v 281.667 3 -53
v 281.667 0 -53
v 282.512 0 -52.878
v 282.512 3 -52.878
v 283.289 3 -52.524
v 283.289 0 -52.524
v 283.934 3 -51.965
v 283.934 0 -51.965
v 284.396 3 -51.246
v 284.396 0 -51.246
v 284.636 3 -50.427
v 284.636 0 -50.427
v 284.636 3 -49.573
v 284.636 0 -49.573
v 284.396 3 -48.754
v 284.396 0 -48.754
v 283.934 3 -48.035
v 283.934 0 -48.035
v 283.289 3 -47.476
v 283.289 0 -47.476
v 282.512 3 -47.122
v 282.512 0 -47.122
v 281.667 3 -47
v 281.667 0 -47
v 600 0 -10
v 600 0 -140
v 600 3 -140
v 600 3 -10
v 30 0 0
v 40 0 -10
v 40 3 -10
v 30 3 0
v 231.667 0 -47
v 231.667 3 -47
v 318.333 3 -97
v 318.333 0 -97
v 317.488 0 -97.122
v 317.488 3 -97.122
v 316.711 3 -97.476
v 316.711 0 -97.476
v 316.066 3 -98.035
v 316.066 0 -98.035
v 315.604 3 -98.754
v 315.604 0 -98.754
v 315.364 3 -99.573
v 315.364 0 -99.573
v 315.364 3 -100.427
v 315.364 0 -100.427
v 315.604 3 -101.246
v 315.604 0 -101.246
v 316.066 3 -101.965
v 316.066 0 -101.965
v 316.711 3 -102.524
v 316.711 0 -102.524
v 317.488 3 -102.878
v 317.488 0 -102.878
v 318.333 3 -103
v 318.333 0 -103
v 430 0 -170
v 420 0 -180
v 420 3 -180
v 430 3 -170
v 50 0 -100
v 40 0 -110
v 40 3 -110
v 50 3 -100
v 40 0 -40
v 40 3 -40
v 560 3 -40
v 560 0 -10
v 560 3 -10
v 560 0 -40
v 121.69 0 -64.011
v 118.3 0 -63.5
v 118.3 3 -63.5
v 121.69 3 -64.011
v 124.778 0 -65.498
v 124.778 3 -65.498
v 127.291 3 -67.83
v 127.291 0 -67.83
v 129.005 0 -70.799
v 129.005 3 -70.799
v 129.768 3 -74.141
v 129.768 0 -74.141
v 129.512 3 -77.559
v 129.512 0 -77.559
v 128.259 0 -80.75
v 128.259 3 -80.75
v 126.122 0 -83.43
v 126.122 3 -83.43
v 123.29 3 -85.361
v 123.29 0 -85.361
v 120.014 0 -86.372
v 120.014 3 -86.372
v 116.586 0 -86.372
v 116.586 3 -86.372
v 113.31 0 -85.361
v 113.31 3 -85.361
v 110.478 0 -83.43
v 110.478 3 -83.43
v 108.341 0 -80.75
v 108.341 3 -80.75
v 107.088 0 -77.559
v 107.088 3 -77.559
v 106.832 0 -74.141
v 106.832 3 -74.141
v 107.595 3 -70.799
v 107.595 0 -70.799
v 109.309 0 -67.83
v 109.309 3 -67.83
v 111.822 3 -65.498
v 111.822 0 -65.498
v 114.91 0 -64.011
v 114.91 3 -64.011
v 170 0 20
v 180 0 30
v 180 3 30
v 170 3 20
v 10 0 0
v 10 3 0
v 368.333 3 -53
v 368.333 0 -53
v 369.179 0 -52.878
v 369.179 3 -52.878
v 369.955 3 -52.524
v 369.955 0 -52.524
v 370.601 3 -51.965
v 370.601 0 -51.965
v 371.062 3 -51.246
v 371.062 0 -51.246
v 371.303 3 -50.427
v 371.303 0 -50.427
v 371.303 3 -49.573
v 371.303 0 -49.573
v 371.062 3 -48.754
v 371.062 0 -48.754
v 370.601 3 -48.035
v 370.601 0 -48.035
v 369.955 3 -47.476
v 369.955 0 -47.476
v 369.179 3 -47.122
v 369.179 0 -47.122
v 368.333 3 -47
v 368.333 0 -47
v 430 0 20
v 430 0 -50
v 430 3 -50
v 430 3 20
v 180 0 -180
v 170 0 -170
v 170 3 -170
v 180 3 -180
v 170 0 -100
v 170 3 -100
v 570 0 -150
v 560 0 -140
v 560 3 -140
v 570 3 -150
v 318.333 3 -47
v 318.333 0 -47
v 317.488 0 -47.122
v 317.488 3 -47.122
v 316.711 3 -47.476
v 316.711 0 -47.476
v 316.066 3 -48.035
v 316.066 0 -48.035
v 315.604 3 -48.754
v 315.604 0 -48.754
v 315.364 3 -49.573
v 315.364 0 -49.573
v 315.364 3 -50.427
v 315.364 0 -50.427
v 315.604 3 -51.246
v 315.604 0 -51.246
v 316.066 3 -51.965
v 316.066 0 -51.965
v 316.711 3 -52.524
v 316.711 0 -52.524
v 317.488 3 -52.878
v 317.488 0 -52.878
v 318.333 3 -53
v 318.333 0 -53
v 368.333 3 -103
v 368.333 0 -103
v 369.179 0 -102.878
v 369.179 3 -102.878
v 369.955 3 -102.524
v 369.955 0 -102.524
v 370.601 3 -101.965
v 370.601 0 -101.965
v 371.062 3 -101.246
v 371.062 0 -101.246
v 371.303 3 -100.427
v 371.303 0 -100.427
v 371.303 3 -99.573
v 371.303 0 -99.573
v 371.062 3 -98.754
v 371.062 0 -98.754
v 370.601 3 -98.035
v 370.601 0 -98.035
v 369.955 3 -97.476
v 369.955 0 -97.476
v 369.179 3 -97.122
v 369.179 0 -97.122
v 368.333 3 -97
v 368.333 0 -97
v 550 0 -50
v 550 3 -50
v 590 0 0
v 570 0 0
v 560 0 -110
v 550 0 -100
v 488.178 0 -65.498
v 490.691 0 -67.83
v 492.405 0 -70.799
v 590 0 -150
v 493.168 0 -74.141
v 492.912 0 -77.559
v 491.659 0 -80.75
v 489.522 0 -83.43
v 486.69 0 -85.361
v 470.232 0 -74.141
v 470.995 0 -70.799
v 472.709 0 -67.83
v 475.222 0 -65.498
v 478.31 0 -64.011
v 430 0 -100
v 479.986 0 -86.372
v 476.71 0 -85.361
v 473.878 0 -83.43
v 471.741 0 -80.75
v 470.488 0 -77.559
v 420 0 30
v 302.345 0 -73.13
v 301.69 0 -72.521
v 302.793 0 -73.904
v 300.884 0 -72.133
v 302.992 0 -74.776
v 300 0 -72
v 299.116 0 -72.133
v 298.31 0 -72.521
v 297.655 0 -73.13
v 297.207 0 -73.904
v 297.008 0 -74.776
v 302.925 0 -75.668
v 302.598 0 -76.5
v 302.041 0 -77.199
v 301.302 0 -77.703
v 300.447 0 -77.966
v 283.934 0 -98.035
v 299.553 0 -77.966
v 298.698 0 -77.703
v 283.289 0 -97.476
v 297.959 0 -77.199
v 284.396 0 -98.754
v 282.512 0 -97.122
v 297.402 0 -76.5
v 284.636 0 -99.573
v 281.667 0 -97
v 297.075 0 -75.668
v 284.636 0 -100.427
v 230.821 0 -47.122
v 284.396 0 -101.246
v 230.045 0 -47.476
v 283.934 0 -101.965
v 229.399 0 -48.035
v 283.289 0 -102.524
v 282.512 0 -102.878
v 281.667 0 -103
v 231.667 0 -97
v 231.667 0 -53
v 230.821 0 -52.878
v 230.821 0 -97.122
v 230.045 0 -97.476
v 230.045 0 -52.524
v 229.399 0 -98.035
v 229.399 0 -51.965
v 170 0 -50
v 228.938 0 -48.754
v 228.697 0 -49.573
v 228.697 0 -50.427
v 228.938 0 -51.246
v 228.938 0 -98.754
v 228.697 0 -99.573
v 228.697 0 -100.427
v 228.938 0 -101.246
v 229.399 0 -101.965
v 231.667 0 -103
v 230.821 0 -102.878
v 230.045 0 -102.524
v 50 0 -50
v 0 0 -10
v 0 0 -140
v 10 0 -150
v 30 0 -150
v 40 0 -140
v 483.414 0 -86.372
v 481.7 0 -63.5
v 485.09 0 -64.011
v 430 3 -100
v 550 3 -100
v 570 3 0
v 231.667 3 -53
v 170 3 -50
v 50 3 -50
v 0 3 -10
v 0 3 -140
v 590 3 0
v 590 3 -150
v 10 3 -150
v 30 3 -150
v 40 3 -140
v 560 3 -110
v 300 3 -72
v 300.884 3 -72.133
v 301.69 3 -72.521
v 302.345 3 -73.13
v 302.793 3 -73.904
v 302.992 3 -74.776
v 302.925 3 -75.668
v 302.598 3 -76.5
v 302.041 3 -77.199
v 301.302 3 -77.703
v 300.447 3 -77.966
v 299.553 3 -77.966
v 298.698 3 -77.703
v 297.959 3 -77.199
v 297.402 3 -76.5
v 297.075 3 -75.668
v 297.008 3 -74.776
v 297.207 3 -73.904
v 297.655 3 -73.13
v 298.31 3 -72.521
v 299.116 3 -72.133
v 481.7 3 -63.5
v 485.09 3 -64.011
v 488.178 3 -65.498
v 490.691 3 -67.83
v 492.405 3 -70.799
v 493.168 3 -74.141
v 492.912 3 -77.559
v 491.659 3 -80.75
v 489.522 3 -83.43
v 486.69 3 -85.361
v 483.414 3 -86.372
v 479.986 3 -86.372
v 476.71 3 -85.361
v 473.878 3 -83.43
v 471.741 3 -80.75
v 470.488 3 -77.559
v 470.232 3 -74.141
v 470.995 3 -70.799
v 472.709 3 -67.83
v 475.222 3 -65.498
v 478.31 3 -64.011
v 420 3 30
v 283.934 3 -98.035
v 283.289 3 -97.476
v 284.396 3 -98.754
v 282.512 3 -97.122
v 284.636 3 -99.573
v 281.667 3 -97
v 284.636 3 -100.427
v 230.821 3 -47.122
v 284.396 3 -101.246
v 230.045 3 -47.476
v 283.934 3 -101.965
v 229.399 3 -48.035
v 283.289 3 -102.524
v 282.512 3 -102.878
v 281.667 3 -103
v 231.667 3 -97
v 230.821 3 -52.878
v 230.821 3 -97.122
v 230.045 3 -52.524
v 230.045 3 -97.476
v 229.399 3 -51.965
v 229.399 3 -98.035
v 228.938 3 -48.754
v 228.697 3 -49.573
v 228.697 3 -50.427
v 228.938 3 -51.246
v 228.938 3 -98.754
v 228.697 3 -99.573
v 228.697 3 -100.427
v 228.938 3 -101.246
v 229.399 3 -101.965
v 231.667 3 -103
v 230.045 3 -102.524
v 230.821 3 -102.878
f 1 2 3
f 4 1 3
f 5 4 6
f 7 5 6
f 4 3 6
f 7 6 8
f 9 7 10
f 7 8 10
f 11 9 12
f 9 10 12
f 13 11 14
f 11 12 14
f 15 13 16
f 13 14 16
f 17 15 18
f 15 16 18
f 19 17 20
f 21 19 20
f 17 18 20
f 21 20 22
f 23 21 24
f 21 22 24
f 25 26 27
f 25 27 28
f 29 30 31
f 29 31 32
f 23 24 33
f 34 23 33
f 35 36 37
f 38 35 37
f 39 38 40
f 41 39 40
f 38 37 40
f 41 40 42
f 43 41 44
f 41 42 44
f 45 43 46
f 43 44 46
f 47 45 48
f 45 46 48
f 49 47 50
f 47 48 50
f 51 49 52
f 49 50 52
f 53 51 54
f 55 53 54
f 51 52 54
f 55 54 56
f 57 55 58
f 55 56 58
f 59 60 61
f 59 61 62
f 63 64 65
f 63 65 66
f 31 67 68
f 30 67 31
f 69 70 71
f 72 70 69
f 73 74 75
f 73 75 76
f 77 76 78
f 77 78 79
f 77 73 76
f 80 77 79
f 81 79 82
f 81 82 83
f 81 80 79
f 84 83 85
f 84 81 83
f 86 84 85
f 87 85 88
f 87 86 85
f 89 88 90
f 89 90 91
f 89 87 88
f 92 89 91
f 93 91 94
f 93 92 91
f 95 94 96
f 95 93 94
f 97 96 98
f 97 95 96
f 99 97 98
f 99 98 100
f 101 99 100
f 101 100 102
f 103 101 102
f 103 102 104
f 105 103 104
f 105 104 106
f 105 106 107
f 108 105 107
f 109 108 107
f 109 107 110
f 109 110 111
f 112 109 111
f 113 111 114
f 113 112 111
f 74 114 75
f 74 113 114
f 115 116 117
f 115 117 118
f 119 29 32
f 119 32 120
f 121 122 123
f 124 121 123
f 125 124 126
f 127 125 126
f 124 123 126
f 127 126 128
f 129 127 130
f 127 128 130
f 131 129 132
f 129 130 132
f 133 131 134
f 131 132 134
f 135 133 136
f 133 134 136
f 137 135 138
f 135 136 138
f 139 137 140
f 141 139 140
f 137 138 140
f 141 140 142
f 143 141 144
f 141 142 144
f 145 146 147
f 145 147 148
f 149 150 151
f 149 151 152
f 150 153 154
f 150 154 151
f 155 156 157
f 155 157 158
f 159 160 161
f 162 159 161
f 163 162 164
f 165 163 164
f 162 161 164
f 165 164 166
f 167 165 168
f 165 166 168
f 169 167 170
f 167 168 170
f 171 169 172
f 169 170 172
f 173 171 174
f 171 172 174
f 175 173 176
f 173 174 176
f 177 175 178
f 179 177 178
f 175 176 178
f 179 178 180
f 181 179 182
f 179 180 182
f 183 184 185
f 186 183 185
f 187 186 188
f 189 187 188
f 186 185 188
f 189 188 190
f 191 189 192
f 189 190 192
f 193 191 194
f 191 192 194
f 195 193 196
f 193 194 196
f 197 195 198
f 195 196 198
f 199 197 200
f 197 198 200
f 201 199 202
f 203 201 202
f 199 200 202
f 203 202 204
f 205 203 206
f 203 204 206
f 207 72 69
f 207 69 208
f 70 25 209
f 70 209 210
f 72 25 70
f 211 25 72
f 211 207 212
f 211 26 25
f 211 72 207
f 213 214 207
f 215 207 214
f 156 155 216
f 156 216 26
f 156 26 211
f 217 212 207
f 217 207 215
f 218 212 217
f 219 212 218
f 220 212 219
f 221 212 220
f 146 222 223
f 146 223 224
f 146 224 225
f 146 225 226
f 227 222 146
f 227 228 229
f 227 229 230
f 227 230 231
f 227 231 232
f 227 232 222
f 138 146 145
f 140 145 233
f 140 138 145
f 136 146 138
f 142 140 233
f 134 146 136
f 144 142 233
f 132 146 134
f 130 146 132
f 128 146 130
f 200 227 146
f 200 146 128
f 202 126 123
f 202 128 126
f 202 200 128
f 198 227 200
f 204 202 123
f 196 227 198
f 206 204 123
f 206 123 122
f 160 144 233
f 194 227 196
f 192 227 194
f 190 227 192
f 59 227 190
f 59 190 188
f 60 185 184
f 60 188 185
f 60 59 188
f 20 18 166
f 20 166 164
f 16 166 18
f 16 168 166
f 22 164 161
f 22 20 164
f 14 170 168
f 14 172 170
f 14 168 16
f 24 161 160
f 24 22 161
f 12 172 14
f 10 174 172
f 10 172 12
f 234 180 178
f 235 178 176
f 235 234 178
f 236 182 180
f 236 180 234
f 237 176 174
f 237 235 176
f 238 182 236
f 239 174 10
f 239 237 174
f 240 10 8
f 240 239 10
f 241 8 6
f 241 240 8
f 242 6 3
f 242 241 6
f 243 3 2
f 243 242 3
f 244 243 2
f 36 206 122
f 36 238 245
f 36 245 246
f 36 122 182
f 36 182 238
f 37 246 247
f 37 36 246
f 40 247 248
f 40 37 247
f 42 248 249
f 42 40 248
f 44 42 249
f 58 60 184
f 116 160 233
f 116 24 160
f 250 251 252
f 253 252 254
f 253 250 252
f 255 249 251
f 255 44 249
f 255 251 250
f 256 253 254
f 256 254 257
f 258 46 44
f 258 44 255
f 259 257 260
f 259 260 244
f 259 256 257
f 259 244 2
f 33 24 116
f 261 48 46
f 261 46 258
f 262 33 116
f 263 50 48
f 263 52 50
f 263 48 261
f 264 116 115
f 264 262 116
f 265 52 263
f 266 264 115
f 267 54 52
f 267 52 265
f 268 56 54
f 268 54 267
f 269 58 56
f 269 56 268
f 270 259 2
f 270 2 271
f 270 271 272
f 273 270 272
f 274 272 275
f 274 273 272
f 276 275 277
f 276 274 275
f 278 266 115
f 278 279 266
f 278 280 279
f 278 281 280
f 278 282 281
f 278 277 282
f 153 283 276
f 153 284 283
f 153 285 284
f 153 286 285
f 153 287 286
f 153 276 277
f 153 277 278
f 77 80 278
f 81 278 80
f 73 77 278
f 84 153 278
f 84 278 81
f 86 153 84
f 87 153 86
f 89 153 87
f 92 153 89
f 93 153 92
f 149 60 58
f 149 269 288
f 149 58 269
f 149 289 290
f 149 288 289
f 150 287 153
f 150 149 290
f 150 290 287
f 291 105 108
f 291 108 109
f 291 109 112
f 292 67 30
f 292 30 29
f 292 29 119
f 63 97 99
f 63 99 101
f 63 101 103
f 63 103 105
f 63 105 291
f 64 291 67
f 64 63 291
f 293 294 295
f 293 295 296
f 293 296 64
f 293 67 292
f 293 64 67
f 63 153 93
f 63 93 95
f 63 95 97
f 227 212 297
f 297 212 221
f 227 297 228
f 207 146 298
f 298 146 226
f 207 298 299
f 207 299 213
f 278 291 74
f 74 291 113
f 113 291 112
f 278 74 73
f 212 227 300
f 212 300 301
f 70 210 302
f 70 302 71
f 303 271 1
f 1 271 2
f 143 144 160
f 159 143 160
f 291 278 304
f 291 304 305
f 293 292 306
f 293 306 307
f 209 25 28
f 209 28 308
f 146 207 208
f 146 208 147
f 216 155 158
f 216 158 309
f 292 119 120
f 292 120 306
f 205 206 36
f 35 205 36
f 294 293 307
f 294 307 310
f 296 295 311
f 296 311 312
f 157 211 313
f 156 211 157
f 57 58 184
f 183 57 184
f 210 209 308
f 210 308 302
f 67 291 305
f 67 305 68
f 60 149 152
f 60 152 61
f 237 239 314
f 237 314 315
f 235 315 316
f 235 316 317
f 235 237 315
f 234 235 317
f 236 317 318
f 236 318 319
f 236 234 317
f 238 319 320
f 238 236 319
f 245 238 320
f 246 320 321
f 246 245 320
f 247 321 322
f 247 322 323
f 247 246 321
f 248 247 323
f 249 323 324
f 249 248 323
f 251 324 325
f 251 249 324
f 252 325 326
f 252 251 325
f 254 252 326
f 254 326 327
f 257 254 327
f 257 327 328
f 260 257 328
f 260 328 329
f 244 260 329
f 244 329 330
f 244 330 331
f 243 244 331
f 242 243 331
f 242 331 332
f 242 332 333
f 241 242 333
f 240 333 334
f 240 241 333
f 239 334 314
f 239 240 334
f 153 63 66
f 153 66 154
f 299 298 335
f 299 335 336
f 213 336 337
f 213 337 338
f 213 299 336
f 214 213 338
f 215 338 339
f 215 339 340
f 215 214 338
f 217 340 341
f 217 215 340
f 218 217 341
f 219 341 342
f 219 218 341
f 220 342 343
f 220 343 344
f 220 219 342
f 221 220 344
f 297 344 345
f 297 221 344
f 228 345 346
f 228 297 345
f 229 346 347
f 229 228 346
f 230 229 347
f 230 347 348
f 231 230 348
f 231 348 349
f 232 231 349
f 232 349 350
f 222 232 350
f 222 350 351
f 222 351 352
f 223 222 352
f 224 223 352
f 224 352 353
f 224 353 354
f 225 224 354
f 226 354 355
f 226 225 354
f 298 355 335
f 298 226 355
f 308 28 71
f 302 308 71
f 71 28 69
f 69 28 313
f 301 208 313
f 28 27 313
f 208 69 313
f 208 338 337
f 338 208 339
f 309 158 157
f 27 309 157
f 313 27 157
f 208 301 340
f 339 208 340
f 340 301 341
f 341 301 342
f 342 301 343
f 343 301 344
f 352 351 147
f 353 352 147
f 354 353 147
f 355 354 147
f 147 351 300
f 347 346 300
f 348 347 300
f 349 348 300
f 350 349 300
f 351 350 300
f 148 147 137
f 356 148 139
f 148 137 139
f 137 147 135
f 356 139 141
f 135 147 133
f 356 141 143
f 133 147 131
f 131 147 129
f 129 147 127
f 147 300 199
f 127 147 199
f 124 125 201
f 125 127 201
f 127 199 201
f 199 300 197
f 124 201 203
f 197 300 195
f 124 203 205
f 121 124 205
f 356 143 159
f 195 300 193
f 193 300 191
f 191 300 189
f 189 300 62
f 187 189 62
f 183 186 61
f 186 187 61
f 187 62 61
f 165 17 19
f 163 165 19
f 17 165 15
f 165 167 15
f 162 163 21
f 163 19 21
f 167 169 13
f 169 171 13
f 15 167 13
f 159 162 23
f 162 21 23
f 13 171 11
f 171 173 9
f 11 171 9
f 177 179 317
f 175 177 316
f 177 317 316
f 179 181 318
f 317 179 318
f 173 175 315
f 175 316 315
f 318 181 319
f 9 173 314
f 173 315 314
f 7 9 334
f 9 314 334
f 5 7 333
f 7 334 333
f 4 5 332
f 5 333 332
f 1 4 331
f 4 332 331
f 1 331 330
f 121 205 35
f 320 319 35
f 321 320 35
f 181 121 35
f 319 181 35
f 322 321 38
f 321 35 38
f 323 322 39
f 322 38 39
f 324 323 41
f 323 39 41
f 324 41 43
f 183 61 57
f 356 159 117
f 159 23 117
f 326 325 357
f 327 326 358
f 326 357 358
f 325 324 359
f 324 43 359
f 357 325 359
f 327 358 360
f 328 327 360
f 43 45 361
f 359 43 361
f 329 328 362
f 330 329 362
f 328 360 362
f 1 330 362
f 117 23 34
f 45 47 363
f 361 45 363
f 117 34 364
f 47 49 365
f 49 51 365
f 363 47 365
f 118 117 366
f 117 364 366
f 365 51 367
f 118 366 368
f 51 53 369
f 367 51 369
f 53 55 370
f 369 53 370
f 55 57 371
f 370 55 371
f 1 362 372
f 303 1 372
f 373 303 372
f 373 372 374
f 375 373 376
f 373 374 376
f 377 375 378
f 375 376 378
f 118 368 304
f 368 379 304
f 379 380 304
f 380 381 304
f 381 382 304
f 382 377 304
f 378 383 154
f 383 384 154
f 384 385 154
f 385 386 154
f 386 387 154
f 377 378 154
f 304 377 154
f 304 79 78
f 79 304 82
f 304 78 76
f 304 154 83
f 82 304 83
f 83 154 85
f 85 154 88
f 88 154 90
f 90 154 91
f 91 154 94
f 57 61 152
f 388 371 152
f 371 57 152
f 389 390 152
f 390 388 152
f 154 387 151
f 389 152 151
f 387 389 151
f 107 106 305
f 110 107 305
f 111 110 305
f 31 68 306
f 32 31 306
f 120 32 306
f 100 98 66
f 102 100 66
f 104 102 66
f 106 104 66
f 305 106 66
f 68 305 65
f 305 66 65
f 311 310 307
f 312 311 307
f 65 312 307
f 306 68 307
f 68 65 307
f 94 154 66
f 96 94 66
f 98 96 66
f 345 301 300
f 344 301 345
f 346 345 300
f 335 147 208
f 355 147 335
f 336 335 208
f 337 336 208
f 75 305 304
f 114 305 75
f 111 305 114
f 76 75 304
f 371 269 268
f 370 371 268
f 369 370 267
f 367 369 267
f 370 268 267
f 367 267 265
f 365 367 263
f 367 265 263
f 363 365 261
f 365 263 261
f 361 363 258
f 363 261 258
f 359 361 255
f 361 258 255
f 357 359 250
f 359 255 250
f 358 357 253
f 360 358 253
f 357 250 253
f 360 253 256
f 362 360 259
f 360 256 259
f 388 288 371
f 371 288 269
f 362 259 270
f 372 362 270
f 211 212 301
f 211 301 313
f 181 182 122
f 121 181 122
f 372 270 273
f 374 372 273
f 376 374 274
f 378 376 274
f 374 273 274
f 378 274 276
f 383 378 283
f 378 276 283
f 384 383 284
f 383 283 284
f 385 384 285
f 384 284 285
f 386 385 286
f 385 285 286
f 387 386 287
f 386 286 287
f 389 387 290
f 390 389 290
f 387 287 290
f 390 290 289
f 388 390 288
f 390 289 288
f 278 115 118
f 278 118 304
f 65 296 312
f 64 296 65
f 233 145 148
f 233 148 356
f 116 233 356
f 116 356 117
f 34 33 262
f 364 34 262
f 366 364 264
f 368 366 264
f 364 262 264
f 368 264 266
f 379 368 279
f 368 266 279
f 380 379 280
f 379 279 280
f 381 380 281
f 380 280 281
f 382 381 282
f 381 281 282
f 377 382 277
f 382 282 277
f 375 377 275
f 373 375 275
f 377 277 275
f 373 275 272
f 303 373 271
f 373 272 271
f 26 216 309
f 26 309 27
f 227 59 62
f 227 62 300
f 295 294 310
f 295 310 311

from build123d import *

# Parameters (mm, degrees)
SKETCH1_R           = 11.5
SKETCH1_R_2         = 3
BOSS_EXTRUDE1_DEPTH = 3


with BuildPart() as part:
    # Sketch1 → Boss-Extrude1 (new body)
    with BuildSketch(Plane(origin=(0, 0, 0), x_dir=(1, 0, 0), z_dir=(0, 1, 0))):
        Polygon((10, 150), (30, 150), (40, 140), (40, 110), (50, 100), (170, 100), (170, 170), (180, 180), (420, 180), (430, 170), (430, 100), (550, 100), (560, 110), (560, 140), (570, 150), (590, 150), (600, 140), (600, 10), (590, 0), (570, 0), (560, 10), (560, 40), (550, 50), (430, 50), (430, -20), (420, -30), (180, -30), (170, -20), (170, 50), (50, 50), (40, 40), (40, 10), (30, 0), (10, 0), (0, 10), (0, 140), align=None)
        with Locations(Location((118.3, 75, 0), (0, 0, 270))):
            Circle(SKETCH1_R, mode=Mode.SUBTRACT)
        with Locations(Location((481.7, 75, 0), (0, 0, 270))):
            Circle(SKETCH1_R, mode=Mode.SUBTRACT)
        with Locations(Location((300, 75, 0), (0, 0, 270))):
            Circle(SKETCH1_R_2, mode=Mode.SUBTRACT)
        with BuildLine():
            Line((231.666666667, 103), (281.666666667, 103))
            ThreePointArc((281.666666667, 103), (284.666666667, 100), (281.666666667, 97))
            Line((281.666666667, 97), (231.666666667, 97))
            ThreePointArc((231.666666667, 97), (228.666666667, 100), (231.666666667, 103))
        make_face(mode=Mode.SUBTRACT)
        with BuildLine():
            Line((318.333333333, 103), (368.333333333, 103))
            ThreePointArc((368.333333333, 103), (371.333333333, 100), (368.333333333, 97))
            Line((368.333333333, 97), (318.333333333, 97))
            ThreePointArc((318.333333333, 97), (315.333333333, 100), (318.333333333, 103))
        make_face(mode=Mode.SUBTRACT)
        with BuildLine():
            Line((231.666666667, 53), (281.666666667, 53))
            ThreePointArc((281.666666667, 53), (284.666666667, 50), (281.666666667, 47))
            Line((281.666666667, 47), (231.666666667, 47))
            ThreePointArc((231.666666667, 47), (228.666666667, 50), (231.666666667, 53))
        make_face(mode=Mode.SUBTRACT)
        with BuildLine():
            Line((318.333333333, 53), (368.333333333, 53))
            ThreePointArc((368.333333333, 53), (371.333333333, 50), (368.333333333, 47))
            Line((368.333333333, 47), (318.333333333, 47))
            ThreePointArc((318.333333333, 47), (315.333333333, 50), (318.333333333, 53))
        make_face(mode=Mode.SUBTRACT)
    extrude(amount=BOSS_EXTRUDE1_DEPTH)


solid = part.part
